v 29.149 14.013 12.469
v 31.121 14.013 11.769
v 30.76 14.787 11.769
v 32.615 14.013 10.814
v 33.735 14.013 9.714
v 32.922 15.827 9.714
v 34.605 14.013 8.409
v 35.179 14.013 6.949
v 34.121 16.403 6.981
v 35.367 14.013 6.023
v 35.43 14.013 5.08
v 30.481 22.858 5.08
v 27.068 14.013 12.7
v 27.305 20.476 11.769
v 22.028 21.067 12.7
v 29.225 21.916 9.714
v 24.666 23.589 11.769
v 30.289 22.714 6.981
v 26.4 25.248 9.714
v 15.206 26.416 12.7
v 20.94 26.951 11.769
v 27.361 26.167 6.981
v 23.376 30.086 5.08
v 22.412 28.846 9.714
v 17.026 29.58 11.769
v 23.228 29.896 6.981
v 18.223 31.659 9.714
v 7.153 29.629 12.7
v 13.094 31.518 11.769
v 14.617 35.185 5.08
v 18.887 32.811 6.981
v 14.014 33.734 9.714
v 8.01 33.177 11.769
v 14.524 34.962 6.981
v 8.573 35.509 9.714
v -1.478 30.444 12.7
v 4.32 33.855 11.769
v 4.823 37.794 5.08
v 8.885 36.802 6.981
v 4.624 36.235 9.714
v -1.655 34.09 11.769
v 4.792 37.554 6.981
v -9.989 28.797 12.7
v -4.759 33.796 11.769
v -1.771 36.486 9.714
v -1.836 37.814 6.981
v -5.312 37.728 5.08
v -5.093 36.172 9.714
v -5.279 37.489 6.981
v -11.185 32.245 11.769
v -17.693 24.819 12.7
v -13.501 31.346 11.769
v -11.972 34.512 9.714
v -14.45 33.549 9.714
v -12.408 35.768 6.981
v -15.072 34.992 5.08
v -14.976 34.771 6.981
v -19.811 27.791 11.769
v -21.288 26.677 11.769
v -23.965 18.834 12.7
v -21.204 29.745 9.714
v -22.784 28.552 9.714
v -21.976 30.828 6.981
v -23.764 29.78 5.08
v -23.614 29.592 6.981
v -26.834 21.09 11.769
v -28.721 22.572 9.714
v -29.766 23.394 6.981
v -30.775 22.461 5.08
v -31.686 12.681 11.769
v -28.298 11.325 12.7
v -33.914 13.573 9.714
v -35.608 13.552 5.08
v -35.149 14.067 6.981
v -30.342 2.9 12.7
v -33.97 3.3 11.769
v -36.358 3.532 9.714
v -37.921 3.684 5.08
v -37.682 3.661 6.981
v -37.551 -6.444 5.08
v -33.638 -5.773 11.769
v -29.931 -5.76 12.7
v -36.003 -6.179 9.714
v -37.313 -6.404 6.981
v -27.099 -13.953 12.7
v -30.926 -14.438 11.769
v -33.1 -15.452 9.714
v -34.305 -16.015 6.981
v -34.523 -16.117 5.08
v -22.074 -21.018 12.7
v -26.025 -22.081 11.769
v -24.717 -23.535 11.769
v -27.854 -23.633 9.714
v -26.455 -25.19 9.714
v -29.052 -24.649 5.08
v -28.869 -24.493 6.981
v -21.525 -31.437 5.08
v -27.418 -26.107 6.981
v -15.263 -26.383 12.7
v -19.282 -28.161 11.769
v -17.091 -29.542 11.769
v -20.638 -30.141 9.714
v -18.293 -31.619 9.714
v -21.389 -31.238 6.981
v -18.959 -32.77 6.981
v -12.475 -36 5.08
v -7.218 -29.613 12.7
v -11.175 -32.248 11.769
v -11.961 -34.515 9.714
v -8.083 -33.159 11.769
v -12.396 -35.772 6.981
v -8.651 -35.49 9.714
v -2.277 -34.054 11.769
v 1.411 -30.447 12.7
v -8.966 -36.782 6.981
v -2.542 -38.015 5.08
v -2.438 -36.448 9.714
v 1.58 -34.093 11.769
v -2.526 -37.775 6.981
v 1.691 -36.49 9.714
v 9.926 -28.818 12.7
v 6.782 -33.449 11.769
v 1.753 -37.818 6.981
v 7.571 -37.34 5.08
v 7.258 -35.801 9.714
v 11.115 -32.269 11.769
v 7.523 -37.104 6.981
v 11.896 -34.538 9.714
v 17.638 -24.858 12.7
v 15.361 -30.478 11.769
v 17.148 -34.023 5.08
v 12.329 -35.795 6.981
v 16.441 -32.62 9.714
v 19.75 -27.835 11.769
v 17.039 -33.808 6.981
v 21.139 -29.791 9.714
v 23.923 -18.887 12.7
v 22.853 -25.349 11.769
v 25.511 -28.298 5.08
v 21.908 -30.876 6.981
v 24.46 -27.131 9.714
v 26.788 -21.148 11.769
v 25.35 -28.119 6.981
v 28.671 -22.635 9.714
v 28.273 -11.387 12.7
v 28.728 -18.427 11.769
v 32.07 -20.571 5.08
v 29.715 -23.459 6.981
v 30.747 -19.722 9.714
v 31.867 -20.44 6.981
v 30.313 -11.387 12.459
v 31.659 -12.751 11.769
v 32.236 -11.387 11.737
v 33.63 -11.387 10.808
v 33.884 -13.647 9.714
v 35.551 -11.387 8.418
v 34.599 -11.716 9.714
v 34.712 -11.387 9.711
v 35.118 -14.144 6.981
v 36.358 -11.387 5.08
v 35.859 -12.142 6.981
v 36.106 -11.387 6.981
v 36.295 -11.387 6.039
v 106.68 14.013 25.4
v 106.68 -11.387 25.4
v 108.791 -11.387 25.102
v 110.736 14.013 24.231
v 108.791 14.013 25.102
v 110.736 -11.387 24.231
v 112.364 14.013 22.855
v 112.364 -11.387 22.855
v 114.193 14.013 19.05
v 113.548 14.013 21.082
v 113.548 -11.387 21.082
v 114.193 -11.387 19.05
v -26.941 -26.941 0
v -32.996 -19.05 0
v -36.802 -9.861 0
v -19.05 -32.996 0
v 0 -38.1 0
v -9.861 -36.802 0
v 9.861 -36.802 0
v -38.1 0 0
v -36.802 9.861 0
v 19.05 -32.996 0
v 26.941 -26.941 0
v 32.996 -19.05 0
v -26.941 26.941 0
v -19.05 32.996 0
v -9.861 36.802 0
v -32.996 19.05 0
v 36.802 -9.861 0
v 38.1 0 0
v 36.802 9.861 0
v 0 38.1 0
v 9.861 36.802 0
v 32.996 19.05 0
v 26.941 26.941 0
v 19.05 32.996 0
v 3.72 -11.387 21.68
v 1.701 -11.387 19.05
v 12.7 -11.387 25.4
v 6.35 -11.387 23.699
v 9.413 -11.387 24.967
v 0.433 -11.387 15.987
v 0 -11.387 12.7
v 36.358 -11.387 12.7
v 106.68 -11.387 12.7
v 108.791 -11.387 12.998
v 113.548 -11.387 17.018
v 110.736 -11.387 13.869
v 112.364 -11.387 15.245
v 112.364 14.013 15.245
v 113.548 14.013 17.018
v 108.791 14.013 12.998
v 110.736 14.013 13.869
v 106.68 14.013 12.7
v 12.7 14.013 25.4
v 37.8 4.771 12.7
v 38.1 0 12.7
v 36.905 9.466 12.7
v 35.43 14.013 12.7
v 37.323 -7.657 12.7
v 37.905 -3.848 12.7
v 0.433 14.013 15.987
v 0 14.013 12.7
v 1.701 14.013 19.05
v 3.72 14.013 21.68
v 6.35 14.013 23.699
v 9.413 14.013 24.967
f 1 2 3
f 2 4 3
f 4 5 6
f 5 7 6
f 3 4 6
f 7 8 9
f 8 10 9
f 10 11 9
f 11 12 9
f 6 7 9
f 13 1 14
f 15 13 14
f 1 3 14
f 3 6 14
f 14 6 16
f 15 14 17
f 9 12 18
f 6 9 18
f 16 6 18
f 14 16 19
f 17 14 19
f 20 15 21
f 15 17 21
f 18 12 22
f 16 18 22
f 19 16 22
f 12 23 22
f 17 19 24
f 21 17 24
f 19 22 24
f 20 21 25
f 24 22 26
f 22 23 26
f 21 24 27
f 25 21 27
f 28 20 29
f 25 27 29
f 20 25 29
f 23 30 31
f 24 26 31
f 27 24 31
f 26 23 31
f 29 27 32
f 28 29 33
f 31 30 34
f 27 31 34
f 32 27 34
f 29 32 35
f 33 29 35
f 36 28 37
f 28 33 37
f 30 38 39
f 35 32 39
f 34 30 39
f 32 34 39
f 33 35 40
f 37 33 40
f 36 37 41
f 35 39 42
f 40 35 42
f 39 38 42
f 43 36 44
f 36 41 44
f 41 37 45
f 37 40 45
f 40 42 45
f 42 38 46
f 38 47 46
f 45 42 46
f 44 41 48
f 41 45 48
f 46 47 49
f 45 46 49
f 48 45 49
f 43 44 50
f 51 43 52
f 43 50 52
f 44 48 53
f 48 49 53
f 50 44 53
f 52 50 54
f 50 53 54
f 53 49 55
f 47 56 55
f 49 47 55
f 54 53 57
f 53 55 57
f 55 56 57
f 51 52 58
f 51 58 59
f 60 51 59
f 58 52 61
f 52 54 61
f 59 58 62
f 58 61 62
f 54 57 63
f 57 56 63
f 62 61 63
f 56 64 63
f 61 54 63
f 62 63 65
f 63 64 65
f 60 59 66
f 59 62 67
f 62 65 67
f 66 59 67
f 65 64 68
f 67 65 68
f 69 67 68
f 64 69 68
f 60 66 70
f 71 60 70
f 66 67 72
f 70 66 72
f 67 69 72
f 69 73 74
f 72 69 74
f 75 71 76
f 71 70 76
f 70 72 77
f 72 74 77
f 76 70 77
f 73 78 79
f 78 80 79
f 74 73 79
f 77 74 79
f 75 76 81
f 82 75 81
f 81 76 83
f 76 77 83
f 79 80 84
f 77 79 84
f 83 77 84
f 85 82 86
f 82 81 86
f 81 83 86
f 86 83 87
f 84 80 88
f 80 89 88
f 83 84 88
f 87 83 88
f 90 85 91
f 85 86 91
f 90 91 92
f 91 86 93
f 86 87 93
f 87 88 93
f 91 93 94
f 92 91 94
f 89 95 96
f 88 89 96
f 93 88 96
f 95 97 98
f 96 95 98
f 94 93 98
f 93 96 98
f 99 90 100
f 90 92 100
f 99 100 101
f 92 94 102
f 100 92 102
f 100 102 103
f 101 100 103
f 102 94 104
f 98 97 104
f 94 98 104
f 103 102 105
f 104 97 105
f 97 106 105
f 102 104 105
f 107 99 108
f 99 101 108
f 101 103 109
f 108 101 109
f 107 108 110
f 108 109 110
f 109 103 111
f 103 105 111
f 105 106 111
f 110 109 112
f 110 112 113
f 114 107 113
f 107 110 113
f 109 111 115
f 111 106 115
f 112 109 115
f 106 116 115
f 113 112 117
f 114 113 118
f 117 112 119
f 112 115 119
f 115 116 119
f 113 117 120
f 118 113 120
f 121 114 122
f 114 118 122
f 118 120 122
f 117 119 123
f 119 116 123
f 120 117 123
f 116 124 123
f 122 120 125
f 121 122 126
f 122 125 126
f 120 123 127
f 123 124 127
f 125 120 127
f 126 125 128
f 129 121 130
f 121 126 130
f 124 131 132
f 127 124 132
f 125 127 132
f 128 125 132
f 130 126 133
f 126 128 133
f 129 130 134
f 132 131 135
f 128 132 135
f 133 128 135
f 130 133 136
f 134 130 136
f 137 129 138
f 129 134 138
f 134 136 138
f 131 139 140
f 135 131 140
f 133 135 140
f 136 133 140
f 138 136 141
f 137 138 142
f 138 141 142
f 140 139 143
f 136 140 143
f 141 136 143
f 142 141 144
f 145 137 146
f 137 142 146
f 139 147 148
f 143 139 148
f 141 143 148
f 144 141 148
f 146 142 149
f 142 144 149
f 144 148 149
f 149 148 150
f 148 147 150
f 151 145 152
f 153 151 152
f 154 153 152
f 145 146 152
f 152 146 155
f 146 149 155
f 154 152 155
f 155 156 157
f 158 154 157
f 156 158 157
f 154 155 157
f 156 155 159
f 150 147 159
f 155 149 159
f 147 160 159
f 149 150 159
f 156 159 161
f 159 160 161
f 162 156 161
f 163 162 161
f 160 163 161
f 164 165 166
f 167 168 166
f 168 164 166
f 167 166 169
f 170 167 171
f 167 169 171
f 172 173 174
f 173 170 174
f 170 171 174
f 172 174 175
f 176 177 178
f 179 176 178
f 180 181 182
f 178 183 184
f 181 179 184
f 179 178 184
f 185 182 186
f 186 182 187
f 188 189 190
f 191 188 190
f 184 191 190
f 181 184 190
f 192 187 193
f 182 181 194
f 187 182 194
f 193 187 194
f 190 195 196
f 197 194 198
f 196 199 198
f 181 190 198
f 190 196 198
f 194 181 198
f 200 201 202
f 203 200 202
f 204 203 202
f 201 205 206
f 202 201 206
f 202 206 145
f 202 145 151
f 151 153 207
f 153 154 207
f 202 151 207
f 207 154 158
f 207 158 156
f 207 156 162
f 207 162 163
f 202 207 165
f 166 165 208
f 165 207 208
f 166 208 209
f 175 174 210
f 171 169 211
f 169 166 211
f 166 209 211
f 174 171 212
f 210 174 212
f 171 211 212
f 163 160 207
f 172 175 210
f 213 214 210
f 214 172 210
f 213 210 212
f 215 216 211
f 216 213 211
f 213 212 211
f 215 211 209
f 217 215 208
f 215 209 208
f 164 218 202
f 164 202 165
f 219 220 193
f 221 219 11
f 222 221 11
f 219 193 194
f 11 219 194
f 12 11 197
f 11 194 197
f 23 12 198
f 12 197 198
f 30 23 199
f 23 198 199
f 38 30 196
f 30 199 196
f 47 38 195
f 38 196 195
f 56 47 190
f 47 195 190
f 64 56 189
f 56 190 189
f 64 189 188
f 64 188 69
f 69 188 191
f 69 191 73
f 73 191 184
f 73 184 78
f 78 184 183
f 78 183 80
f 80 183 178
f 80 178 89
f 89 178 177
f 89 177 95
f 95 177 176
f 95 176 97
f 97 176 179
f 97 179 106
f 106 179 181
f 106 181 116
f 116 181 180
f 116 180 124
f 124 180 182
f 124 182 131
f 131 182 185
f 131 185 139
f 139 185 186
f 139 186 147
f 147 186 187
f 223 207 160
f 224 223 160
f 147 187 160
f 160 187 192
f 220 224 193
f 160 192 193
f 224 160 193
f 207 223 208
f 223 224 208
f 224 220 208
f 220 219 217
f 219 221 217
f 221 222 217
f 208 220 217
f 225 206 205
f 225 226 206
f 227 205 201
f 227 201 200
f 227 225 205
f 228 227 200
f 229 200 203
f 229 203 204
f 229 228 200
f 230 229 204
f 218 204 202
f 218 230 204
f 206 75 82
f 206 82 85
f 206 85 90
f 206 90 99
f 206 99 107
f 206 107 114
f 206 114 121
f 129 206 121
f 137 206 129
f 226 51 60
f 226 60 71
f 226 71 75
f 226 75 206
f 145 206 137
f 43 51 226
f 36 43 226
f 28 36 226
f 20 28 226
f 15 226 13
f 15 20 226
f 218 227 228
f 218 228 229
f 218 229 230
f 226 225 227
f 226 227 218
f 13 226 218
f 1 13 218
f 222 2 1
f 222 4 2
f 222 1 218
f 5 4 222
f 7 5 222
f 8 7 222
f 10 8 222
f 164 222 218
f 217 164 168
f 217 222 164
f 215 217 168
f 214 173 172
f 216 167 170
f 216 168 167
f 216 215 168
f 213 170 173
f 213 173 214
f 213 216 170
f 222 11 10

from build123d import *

# Parameters (mm, degrees)
SKETCH1_R           = 38.1
BOSS_EXTRUDE1_DEPTH = 12.7
SKETCH2_W           = 114.3
SKETCH2_H           = 25.4
BOSS_EXTRUDE2_DEPTH = 12.7
FILLET1_R           = 12.7
FILLET4_R           = 7.62
FILLET5_R           = 7.62


# Some blends are built 0.0001 mm under size
with BuildPart() as part:
    # Sketch1 → Boss-Extrude1 (new body)
    with BuildSketch(Plane.XY):
        Circle(SKETCH1_R)
    extrude(amount=BOSS_EXTRUDE1_DEPTH)

    # Sketch2 → Boss-Extrude2 (add)
    with BuildSketch(Plane.XY.offset(12.7)):
        with Locations((57.15, 1.312743298)):
            Rectangle(SKETCH2_W, SKETCH2_H)
    extrude(amount=BOSS_EXTRUDE2_DEPTH)

    # Fillet1
    fillet1_edges = [part.edges().sort_by_distance(p)[0] for p in [
        (0, 1.312743298, 25.4),
    ]]
    fillet(fillet1_edges, radius=FILLET1_R - 0.0001)  # a hair under: the kernel refuses the full size

    # Fillet4
    # the kernel refuses this fillet: 7.62 mm, written as the material it takes off along each edge
    with BuildSketch(Plane(origin=(114.3, -30.437256702, 12.7), x_dir=(-1, 0, 0), z_dir=(0, 1, 0))) as fillet4_piece_1:
        with BuildLine():
            CenterArc((FILLET4_R, FILLET4_R), FILLET4_R, 180, 90)
            Line((0, FILLET4_R), (0, 0))
            Line((0, 0), (FILLET4_R, 0))
        make_face()
    extrude(amount=63.5, mode=Mode.SUBTRACT)
    with BuildSketch(Plane(origin=(114.3, -30.437256702, 25.4), x_dir=(-1, 0, 0), z_dir=(0, 1, 0))) as fillet4_piece_2:
        with BuildLine():
            CenterArc((FILLET4_R, -FILLET4_R), FILLET4_R, 90, 90)
            Line((0, -FILLET4_R), (0, 0))
            Line((0, 0), (FILLET4_R, 0))
        make_face()
    extrude(amount=63.5, mode=Mode.SUBTRACT)

    # Fillet5
    fillet5_edges = [part.edges().sort_by_distance(p)[0] for p in [
        (-38.074544895, -1.392490946, 12.7),
    ]]
    fillet(fillet5_edges, radius=FILLET5_R)


solid = part.part
